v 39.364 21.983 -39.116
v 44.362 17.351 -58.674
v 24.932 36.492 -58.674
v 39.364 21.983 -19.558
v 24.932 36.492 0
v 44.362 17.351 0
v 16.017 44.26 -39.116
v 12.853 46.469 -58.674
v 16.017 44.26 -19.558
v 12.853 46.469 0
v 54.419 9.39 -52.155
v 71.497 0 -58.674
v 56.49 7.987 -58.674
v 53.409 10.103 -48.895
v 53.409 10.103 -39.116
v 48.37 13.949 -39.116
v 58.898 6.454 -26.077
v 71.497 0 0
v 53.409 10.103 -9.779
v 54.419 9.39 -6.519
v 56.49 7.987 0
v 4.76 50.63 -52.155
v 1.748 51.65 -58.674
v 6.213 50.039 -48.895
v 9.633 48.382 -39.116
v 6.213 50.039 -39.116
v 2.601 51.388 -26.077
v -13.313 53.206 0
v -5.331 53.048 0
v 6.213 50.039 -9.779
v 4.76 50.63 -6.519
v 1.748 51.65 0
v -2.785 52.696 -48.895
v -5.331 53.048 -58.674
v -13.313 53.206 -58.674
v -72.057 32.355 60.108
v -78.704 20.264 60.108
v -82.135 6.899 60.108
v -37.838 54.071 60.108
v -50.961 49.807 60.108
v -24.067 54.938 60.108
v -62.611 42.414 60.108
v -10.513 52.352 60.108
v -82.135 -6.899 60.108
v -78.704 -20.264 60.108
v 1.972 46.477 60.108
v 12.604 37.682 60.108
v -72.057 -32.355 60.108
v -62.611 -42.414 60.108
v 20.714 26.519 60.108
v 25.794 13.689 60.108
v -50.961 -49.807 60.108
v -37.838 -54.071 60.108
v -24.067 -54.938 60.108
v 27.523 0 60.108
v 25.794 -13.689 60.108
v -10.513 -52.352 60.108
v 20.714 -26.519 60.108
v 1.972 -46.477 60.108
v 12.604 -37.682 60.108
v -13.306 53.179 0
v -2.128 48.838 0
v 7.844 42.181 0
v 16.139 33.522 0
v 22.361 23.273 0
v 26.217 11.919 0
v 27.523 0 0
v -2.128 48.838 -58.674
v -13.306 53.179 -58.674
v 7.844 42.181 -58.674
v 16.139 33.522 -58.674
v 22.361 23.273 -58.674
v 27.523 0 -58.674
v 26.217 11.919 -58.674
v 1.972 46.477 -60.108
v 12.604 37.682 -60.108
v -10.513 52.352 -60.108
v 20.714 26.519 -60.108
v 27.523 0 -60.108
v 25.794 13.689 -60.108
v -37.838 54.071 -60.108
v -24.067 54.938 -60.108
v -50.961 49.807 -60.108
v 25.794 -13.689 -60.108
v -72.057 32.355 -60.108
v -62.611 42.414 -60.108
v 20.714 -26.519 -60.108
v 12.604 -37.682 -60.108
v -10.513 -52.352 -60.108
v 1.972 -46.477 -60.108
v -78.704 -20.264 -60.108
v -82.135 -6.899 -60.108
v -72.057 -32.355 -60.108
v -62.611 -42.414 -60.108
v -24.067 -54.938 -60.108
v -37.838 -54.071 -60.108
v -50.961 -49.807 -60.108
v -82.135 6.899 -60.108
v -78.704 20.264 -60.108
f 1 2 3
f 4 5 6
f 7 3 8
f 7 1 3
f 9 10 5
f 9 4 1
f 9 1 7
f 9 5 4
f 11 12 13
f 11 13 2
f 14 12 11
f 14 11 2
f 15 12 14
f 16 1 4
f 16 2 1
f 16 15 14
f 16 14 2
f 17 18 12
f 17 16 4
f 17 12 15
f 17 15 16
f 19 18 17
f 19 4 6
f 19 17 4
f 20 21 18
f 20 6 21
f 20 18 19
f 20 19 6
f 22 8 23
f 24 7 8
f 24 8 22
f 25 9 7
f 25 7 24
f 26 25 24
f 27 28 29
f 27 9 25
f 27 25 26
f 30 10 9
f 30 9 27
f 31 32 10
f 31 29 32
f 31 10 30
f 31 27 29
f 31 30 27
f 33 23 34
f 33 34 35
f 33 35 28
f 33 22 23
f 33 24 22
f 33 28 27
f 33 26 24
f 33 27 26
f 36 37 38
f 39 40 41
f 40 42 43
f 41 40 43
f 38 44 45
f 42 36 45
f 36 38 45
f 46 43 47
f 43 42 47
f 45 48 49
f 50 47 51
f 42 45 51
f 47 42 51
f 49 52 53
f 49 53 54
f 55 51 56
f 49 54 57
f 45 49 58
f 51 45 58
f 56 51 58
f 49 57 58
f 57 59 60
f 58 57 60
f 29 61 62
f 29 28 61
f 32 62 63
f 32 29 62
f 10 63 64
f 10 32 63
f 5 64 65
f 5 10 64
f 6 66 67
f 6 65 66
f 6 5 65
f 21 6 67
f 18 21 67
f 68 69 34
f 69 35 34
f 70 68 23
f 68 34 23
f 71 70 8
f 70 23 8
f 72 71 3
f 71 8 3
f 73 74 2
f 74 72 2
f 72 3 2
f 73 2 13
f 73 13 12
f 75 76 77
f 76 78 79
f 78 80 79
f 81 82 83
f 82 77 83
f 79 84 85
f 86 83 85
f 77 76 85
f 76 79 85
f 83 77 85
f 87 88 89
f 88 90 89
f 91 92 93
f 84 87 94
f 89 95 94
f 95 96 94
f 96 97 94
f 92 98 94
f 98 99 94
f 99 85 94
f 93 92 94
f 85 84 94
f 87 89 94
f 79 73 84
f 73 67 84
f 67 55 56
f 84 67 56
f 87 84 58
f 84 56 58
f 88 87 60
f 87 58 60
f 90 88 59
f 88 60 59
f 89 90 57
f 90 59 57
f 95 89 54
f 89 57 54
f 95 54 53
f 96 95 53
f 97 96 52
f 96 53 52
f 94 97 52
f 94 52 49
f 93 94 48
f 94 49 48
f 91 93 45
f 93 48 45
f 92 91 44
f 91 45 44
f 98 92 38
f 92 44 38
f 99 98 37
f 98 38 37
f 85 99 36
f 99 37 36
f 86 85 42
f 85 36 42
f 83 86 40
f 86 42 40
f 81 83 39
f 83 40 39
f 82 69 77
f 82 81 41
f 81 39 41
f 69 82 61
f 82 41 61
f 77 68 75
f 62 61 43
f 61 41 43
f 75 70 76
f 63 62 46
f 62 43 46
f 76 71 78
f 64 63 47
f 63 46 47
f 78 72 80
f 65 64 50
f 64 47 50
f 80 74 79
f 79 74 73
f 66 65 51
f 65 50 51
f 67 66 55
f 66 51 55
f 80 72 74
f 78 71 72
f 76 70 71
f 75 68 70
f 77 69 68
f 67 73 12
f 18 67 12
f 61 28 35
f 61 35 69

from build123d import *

# Parameters (mm, degrees)
F3_DEPTH = 58.674


with BuildPart() as f1:
    # F0 (on Front) → F1 (revolve)
    with BuildSketch(Plane.XZ):
        Polygon((27.523137, 37.01387), (27.523137, 60.107984), (-27.523137, 60.107984), (-27.523137, -60.107984), (27.523137, -60.107984), (27.523137, -54.729901), align=None)
    revolve(axis=Axis((-27.523137, 0, 0), (0, 0, -1)))

    # F2 (on Top) → F3 (join)
    with BuildSketch(Plane.XY):
        with BuildLine():
            Line((0, 0), (71.496874, 0))
            add(Edge.make_bspline(
                [(71.496874, 0), (30.049184, 17.29304), (23.930628, 55.467509), (-13.312755, 53.206302)],
                knots=[0, 0, 0, 0, 100.11785, 100.11785, 100.11785, 100.11785], degree=3))
            Line((-13.312755, 53.206302), (0, 0))
        make_face()
    extrude(amount=-F3_DEPTH)


solid = f1.part
